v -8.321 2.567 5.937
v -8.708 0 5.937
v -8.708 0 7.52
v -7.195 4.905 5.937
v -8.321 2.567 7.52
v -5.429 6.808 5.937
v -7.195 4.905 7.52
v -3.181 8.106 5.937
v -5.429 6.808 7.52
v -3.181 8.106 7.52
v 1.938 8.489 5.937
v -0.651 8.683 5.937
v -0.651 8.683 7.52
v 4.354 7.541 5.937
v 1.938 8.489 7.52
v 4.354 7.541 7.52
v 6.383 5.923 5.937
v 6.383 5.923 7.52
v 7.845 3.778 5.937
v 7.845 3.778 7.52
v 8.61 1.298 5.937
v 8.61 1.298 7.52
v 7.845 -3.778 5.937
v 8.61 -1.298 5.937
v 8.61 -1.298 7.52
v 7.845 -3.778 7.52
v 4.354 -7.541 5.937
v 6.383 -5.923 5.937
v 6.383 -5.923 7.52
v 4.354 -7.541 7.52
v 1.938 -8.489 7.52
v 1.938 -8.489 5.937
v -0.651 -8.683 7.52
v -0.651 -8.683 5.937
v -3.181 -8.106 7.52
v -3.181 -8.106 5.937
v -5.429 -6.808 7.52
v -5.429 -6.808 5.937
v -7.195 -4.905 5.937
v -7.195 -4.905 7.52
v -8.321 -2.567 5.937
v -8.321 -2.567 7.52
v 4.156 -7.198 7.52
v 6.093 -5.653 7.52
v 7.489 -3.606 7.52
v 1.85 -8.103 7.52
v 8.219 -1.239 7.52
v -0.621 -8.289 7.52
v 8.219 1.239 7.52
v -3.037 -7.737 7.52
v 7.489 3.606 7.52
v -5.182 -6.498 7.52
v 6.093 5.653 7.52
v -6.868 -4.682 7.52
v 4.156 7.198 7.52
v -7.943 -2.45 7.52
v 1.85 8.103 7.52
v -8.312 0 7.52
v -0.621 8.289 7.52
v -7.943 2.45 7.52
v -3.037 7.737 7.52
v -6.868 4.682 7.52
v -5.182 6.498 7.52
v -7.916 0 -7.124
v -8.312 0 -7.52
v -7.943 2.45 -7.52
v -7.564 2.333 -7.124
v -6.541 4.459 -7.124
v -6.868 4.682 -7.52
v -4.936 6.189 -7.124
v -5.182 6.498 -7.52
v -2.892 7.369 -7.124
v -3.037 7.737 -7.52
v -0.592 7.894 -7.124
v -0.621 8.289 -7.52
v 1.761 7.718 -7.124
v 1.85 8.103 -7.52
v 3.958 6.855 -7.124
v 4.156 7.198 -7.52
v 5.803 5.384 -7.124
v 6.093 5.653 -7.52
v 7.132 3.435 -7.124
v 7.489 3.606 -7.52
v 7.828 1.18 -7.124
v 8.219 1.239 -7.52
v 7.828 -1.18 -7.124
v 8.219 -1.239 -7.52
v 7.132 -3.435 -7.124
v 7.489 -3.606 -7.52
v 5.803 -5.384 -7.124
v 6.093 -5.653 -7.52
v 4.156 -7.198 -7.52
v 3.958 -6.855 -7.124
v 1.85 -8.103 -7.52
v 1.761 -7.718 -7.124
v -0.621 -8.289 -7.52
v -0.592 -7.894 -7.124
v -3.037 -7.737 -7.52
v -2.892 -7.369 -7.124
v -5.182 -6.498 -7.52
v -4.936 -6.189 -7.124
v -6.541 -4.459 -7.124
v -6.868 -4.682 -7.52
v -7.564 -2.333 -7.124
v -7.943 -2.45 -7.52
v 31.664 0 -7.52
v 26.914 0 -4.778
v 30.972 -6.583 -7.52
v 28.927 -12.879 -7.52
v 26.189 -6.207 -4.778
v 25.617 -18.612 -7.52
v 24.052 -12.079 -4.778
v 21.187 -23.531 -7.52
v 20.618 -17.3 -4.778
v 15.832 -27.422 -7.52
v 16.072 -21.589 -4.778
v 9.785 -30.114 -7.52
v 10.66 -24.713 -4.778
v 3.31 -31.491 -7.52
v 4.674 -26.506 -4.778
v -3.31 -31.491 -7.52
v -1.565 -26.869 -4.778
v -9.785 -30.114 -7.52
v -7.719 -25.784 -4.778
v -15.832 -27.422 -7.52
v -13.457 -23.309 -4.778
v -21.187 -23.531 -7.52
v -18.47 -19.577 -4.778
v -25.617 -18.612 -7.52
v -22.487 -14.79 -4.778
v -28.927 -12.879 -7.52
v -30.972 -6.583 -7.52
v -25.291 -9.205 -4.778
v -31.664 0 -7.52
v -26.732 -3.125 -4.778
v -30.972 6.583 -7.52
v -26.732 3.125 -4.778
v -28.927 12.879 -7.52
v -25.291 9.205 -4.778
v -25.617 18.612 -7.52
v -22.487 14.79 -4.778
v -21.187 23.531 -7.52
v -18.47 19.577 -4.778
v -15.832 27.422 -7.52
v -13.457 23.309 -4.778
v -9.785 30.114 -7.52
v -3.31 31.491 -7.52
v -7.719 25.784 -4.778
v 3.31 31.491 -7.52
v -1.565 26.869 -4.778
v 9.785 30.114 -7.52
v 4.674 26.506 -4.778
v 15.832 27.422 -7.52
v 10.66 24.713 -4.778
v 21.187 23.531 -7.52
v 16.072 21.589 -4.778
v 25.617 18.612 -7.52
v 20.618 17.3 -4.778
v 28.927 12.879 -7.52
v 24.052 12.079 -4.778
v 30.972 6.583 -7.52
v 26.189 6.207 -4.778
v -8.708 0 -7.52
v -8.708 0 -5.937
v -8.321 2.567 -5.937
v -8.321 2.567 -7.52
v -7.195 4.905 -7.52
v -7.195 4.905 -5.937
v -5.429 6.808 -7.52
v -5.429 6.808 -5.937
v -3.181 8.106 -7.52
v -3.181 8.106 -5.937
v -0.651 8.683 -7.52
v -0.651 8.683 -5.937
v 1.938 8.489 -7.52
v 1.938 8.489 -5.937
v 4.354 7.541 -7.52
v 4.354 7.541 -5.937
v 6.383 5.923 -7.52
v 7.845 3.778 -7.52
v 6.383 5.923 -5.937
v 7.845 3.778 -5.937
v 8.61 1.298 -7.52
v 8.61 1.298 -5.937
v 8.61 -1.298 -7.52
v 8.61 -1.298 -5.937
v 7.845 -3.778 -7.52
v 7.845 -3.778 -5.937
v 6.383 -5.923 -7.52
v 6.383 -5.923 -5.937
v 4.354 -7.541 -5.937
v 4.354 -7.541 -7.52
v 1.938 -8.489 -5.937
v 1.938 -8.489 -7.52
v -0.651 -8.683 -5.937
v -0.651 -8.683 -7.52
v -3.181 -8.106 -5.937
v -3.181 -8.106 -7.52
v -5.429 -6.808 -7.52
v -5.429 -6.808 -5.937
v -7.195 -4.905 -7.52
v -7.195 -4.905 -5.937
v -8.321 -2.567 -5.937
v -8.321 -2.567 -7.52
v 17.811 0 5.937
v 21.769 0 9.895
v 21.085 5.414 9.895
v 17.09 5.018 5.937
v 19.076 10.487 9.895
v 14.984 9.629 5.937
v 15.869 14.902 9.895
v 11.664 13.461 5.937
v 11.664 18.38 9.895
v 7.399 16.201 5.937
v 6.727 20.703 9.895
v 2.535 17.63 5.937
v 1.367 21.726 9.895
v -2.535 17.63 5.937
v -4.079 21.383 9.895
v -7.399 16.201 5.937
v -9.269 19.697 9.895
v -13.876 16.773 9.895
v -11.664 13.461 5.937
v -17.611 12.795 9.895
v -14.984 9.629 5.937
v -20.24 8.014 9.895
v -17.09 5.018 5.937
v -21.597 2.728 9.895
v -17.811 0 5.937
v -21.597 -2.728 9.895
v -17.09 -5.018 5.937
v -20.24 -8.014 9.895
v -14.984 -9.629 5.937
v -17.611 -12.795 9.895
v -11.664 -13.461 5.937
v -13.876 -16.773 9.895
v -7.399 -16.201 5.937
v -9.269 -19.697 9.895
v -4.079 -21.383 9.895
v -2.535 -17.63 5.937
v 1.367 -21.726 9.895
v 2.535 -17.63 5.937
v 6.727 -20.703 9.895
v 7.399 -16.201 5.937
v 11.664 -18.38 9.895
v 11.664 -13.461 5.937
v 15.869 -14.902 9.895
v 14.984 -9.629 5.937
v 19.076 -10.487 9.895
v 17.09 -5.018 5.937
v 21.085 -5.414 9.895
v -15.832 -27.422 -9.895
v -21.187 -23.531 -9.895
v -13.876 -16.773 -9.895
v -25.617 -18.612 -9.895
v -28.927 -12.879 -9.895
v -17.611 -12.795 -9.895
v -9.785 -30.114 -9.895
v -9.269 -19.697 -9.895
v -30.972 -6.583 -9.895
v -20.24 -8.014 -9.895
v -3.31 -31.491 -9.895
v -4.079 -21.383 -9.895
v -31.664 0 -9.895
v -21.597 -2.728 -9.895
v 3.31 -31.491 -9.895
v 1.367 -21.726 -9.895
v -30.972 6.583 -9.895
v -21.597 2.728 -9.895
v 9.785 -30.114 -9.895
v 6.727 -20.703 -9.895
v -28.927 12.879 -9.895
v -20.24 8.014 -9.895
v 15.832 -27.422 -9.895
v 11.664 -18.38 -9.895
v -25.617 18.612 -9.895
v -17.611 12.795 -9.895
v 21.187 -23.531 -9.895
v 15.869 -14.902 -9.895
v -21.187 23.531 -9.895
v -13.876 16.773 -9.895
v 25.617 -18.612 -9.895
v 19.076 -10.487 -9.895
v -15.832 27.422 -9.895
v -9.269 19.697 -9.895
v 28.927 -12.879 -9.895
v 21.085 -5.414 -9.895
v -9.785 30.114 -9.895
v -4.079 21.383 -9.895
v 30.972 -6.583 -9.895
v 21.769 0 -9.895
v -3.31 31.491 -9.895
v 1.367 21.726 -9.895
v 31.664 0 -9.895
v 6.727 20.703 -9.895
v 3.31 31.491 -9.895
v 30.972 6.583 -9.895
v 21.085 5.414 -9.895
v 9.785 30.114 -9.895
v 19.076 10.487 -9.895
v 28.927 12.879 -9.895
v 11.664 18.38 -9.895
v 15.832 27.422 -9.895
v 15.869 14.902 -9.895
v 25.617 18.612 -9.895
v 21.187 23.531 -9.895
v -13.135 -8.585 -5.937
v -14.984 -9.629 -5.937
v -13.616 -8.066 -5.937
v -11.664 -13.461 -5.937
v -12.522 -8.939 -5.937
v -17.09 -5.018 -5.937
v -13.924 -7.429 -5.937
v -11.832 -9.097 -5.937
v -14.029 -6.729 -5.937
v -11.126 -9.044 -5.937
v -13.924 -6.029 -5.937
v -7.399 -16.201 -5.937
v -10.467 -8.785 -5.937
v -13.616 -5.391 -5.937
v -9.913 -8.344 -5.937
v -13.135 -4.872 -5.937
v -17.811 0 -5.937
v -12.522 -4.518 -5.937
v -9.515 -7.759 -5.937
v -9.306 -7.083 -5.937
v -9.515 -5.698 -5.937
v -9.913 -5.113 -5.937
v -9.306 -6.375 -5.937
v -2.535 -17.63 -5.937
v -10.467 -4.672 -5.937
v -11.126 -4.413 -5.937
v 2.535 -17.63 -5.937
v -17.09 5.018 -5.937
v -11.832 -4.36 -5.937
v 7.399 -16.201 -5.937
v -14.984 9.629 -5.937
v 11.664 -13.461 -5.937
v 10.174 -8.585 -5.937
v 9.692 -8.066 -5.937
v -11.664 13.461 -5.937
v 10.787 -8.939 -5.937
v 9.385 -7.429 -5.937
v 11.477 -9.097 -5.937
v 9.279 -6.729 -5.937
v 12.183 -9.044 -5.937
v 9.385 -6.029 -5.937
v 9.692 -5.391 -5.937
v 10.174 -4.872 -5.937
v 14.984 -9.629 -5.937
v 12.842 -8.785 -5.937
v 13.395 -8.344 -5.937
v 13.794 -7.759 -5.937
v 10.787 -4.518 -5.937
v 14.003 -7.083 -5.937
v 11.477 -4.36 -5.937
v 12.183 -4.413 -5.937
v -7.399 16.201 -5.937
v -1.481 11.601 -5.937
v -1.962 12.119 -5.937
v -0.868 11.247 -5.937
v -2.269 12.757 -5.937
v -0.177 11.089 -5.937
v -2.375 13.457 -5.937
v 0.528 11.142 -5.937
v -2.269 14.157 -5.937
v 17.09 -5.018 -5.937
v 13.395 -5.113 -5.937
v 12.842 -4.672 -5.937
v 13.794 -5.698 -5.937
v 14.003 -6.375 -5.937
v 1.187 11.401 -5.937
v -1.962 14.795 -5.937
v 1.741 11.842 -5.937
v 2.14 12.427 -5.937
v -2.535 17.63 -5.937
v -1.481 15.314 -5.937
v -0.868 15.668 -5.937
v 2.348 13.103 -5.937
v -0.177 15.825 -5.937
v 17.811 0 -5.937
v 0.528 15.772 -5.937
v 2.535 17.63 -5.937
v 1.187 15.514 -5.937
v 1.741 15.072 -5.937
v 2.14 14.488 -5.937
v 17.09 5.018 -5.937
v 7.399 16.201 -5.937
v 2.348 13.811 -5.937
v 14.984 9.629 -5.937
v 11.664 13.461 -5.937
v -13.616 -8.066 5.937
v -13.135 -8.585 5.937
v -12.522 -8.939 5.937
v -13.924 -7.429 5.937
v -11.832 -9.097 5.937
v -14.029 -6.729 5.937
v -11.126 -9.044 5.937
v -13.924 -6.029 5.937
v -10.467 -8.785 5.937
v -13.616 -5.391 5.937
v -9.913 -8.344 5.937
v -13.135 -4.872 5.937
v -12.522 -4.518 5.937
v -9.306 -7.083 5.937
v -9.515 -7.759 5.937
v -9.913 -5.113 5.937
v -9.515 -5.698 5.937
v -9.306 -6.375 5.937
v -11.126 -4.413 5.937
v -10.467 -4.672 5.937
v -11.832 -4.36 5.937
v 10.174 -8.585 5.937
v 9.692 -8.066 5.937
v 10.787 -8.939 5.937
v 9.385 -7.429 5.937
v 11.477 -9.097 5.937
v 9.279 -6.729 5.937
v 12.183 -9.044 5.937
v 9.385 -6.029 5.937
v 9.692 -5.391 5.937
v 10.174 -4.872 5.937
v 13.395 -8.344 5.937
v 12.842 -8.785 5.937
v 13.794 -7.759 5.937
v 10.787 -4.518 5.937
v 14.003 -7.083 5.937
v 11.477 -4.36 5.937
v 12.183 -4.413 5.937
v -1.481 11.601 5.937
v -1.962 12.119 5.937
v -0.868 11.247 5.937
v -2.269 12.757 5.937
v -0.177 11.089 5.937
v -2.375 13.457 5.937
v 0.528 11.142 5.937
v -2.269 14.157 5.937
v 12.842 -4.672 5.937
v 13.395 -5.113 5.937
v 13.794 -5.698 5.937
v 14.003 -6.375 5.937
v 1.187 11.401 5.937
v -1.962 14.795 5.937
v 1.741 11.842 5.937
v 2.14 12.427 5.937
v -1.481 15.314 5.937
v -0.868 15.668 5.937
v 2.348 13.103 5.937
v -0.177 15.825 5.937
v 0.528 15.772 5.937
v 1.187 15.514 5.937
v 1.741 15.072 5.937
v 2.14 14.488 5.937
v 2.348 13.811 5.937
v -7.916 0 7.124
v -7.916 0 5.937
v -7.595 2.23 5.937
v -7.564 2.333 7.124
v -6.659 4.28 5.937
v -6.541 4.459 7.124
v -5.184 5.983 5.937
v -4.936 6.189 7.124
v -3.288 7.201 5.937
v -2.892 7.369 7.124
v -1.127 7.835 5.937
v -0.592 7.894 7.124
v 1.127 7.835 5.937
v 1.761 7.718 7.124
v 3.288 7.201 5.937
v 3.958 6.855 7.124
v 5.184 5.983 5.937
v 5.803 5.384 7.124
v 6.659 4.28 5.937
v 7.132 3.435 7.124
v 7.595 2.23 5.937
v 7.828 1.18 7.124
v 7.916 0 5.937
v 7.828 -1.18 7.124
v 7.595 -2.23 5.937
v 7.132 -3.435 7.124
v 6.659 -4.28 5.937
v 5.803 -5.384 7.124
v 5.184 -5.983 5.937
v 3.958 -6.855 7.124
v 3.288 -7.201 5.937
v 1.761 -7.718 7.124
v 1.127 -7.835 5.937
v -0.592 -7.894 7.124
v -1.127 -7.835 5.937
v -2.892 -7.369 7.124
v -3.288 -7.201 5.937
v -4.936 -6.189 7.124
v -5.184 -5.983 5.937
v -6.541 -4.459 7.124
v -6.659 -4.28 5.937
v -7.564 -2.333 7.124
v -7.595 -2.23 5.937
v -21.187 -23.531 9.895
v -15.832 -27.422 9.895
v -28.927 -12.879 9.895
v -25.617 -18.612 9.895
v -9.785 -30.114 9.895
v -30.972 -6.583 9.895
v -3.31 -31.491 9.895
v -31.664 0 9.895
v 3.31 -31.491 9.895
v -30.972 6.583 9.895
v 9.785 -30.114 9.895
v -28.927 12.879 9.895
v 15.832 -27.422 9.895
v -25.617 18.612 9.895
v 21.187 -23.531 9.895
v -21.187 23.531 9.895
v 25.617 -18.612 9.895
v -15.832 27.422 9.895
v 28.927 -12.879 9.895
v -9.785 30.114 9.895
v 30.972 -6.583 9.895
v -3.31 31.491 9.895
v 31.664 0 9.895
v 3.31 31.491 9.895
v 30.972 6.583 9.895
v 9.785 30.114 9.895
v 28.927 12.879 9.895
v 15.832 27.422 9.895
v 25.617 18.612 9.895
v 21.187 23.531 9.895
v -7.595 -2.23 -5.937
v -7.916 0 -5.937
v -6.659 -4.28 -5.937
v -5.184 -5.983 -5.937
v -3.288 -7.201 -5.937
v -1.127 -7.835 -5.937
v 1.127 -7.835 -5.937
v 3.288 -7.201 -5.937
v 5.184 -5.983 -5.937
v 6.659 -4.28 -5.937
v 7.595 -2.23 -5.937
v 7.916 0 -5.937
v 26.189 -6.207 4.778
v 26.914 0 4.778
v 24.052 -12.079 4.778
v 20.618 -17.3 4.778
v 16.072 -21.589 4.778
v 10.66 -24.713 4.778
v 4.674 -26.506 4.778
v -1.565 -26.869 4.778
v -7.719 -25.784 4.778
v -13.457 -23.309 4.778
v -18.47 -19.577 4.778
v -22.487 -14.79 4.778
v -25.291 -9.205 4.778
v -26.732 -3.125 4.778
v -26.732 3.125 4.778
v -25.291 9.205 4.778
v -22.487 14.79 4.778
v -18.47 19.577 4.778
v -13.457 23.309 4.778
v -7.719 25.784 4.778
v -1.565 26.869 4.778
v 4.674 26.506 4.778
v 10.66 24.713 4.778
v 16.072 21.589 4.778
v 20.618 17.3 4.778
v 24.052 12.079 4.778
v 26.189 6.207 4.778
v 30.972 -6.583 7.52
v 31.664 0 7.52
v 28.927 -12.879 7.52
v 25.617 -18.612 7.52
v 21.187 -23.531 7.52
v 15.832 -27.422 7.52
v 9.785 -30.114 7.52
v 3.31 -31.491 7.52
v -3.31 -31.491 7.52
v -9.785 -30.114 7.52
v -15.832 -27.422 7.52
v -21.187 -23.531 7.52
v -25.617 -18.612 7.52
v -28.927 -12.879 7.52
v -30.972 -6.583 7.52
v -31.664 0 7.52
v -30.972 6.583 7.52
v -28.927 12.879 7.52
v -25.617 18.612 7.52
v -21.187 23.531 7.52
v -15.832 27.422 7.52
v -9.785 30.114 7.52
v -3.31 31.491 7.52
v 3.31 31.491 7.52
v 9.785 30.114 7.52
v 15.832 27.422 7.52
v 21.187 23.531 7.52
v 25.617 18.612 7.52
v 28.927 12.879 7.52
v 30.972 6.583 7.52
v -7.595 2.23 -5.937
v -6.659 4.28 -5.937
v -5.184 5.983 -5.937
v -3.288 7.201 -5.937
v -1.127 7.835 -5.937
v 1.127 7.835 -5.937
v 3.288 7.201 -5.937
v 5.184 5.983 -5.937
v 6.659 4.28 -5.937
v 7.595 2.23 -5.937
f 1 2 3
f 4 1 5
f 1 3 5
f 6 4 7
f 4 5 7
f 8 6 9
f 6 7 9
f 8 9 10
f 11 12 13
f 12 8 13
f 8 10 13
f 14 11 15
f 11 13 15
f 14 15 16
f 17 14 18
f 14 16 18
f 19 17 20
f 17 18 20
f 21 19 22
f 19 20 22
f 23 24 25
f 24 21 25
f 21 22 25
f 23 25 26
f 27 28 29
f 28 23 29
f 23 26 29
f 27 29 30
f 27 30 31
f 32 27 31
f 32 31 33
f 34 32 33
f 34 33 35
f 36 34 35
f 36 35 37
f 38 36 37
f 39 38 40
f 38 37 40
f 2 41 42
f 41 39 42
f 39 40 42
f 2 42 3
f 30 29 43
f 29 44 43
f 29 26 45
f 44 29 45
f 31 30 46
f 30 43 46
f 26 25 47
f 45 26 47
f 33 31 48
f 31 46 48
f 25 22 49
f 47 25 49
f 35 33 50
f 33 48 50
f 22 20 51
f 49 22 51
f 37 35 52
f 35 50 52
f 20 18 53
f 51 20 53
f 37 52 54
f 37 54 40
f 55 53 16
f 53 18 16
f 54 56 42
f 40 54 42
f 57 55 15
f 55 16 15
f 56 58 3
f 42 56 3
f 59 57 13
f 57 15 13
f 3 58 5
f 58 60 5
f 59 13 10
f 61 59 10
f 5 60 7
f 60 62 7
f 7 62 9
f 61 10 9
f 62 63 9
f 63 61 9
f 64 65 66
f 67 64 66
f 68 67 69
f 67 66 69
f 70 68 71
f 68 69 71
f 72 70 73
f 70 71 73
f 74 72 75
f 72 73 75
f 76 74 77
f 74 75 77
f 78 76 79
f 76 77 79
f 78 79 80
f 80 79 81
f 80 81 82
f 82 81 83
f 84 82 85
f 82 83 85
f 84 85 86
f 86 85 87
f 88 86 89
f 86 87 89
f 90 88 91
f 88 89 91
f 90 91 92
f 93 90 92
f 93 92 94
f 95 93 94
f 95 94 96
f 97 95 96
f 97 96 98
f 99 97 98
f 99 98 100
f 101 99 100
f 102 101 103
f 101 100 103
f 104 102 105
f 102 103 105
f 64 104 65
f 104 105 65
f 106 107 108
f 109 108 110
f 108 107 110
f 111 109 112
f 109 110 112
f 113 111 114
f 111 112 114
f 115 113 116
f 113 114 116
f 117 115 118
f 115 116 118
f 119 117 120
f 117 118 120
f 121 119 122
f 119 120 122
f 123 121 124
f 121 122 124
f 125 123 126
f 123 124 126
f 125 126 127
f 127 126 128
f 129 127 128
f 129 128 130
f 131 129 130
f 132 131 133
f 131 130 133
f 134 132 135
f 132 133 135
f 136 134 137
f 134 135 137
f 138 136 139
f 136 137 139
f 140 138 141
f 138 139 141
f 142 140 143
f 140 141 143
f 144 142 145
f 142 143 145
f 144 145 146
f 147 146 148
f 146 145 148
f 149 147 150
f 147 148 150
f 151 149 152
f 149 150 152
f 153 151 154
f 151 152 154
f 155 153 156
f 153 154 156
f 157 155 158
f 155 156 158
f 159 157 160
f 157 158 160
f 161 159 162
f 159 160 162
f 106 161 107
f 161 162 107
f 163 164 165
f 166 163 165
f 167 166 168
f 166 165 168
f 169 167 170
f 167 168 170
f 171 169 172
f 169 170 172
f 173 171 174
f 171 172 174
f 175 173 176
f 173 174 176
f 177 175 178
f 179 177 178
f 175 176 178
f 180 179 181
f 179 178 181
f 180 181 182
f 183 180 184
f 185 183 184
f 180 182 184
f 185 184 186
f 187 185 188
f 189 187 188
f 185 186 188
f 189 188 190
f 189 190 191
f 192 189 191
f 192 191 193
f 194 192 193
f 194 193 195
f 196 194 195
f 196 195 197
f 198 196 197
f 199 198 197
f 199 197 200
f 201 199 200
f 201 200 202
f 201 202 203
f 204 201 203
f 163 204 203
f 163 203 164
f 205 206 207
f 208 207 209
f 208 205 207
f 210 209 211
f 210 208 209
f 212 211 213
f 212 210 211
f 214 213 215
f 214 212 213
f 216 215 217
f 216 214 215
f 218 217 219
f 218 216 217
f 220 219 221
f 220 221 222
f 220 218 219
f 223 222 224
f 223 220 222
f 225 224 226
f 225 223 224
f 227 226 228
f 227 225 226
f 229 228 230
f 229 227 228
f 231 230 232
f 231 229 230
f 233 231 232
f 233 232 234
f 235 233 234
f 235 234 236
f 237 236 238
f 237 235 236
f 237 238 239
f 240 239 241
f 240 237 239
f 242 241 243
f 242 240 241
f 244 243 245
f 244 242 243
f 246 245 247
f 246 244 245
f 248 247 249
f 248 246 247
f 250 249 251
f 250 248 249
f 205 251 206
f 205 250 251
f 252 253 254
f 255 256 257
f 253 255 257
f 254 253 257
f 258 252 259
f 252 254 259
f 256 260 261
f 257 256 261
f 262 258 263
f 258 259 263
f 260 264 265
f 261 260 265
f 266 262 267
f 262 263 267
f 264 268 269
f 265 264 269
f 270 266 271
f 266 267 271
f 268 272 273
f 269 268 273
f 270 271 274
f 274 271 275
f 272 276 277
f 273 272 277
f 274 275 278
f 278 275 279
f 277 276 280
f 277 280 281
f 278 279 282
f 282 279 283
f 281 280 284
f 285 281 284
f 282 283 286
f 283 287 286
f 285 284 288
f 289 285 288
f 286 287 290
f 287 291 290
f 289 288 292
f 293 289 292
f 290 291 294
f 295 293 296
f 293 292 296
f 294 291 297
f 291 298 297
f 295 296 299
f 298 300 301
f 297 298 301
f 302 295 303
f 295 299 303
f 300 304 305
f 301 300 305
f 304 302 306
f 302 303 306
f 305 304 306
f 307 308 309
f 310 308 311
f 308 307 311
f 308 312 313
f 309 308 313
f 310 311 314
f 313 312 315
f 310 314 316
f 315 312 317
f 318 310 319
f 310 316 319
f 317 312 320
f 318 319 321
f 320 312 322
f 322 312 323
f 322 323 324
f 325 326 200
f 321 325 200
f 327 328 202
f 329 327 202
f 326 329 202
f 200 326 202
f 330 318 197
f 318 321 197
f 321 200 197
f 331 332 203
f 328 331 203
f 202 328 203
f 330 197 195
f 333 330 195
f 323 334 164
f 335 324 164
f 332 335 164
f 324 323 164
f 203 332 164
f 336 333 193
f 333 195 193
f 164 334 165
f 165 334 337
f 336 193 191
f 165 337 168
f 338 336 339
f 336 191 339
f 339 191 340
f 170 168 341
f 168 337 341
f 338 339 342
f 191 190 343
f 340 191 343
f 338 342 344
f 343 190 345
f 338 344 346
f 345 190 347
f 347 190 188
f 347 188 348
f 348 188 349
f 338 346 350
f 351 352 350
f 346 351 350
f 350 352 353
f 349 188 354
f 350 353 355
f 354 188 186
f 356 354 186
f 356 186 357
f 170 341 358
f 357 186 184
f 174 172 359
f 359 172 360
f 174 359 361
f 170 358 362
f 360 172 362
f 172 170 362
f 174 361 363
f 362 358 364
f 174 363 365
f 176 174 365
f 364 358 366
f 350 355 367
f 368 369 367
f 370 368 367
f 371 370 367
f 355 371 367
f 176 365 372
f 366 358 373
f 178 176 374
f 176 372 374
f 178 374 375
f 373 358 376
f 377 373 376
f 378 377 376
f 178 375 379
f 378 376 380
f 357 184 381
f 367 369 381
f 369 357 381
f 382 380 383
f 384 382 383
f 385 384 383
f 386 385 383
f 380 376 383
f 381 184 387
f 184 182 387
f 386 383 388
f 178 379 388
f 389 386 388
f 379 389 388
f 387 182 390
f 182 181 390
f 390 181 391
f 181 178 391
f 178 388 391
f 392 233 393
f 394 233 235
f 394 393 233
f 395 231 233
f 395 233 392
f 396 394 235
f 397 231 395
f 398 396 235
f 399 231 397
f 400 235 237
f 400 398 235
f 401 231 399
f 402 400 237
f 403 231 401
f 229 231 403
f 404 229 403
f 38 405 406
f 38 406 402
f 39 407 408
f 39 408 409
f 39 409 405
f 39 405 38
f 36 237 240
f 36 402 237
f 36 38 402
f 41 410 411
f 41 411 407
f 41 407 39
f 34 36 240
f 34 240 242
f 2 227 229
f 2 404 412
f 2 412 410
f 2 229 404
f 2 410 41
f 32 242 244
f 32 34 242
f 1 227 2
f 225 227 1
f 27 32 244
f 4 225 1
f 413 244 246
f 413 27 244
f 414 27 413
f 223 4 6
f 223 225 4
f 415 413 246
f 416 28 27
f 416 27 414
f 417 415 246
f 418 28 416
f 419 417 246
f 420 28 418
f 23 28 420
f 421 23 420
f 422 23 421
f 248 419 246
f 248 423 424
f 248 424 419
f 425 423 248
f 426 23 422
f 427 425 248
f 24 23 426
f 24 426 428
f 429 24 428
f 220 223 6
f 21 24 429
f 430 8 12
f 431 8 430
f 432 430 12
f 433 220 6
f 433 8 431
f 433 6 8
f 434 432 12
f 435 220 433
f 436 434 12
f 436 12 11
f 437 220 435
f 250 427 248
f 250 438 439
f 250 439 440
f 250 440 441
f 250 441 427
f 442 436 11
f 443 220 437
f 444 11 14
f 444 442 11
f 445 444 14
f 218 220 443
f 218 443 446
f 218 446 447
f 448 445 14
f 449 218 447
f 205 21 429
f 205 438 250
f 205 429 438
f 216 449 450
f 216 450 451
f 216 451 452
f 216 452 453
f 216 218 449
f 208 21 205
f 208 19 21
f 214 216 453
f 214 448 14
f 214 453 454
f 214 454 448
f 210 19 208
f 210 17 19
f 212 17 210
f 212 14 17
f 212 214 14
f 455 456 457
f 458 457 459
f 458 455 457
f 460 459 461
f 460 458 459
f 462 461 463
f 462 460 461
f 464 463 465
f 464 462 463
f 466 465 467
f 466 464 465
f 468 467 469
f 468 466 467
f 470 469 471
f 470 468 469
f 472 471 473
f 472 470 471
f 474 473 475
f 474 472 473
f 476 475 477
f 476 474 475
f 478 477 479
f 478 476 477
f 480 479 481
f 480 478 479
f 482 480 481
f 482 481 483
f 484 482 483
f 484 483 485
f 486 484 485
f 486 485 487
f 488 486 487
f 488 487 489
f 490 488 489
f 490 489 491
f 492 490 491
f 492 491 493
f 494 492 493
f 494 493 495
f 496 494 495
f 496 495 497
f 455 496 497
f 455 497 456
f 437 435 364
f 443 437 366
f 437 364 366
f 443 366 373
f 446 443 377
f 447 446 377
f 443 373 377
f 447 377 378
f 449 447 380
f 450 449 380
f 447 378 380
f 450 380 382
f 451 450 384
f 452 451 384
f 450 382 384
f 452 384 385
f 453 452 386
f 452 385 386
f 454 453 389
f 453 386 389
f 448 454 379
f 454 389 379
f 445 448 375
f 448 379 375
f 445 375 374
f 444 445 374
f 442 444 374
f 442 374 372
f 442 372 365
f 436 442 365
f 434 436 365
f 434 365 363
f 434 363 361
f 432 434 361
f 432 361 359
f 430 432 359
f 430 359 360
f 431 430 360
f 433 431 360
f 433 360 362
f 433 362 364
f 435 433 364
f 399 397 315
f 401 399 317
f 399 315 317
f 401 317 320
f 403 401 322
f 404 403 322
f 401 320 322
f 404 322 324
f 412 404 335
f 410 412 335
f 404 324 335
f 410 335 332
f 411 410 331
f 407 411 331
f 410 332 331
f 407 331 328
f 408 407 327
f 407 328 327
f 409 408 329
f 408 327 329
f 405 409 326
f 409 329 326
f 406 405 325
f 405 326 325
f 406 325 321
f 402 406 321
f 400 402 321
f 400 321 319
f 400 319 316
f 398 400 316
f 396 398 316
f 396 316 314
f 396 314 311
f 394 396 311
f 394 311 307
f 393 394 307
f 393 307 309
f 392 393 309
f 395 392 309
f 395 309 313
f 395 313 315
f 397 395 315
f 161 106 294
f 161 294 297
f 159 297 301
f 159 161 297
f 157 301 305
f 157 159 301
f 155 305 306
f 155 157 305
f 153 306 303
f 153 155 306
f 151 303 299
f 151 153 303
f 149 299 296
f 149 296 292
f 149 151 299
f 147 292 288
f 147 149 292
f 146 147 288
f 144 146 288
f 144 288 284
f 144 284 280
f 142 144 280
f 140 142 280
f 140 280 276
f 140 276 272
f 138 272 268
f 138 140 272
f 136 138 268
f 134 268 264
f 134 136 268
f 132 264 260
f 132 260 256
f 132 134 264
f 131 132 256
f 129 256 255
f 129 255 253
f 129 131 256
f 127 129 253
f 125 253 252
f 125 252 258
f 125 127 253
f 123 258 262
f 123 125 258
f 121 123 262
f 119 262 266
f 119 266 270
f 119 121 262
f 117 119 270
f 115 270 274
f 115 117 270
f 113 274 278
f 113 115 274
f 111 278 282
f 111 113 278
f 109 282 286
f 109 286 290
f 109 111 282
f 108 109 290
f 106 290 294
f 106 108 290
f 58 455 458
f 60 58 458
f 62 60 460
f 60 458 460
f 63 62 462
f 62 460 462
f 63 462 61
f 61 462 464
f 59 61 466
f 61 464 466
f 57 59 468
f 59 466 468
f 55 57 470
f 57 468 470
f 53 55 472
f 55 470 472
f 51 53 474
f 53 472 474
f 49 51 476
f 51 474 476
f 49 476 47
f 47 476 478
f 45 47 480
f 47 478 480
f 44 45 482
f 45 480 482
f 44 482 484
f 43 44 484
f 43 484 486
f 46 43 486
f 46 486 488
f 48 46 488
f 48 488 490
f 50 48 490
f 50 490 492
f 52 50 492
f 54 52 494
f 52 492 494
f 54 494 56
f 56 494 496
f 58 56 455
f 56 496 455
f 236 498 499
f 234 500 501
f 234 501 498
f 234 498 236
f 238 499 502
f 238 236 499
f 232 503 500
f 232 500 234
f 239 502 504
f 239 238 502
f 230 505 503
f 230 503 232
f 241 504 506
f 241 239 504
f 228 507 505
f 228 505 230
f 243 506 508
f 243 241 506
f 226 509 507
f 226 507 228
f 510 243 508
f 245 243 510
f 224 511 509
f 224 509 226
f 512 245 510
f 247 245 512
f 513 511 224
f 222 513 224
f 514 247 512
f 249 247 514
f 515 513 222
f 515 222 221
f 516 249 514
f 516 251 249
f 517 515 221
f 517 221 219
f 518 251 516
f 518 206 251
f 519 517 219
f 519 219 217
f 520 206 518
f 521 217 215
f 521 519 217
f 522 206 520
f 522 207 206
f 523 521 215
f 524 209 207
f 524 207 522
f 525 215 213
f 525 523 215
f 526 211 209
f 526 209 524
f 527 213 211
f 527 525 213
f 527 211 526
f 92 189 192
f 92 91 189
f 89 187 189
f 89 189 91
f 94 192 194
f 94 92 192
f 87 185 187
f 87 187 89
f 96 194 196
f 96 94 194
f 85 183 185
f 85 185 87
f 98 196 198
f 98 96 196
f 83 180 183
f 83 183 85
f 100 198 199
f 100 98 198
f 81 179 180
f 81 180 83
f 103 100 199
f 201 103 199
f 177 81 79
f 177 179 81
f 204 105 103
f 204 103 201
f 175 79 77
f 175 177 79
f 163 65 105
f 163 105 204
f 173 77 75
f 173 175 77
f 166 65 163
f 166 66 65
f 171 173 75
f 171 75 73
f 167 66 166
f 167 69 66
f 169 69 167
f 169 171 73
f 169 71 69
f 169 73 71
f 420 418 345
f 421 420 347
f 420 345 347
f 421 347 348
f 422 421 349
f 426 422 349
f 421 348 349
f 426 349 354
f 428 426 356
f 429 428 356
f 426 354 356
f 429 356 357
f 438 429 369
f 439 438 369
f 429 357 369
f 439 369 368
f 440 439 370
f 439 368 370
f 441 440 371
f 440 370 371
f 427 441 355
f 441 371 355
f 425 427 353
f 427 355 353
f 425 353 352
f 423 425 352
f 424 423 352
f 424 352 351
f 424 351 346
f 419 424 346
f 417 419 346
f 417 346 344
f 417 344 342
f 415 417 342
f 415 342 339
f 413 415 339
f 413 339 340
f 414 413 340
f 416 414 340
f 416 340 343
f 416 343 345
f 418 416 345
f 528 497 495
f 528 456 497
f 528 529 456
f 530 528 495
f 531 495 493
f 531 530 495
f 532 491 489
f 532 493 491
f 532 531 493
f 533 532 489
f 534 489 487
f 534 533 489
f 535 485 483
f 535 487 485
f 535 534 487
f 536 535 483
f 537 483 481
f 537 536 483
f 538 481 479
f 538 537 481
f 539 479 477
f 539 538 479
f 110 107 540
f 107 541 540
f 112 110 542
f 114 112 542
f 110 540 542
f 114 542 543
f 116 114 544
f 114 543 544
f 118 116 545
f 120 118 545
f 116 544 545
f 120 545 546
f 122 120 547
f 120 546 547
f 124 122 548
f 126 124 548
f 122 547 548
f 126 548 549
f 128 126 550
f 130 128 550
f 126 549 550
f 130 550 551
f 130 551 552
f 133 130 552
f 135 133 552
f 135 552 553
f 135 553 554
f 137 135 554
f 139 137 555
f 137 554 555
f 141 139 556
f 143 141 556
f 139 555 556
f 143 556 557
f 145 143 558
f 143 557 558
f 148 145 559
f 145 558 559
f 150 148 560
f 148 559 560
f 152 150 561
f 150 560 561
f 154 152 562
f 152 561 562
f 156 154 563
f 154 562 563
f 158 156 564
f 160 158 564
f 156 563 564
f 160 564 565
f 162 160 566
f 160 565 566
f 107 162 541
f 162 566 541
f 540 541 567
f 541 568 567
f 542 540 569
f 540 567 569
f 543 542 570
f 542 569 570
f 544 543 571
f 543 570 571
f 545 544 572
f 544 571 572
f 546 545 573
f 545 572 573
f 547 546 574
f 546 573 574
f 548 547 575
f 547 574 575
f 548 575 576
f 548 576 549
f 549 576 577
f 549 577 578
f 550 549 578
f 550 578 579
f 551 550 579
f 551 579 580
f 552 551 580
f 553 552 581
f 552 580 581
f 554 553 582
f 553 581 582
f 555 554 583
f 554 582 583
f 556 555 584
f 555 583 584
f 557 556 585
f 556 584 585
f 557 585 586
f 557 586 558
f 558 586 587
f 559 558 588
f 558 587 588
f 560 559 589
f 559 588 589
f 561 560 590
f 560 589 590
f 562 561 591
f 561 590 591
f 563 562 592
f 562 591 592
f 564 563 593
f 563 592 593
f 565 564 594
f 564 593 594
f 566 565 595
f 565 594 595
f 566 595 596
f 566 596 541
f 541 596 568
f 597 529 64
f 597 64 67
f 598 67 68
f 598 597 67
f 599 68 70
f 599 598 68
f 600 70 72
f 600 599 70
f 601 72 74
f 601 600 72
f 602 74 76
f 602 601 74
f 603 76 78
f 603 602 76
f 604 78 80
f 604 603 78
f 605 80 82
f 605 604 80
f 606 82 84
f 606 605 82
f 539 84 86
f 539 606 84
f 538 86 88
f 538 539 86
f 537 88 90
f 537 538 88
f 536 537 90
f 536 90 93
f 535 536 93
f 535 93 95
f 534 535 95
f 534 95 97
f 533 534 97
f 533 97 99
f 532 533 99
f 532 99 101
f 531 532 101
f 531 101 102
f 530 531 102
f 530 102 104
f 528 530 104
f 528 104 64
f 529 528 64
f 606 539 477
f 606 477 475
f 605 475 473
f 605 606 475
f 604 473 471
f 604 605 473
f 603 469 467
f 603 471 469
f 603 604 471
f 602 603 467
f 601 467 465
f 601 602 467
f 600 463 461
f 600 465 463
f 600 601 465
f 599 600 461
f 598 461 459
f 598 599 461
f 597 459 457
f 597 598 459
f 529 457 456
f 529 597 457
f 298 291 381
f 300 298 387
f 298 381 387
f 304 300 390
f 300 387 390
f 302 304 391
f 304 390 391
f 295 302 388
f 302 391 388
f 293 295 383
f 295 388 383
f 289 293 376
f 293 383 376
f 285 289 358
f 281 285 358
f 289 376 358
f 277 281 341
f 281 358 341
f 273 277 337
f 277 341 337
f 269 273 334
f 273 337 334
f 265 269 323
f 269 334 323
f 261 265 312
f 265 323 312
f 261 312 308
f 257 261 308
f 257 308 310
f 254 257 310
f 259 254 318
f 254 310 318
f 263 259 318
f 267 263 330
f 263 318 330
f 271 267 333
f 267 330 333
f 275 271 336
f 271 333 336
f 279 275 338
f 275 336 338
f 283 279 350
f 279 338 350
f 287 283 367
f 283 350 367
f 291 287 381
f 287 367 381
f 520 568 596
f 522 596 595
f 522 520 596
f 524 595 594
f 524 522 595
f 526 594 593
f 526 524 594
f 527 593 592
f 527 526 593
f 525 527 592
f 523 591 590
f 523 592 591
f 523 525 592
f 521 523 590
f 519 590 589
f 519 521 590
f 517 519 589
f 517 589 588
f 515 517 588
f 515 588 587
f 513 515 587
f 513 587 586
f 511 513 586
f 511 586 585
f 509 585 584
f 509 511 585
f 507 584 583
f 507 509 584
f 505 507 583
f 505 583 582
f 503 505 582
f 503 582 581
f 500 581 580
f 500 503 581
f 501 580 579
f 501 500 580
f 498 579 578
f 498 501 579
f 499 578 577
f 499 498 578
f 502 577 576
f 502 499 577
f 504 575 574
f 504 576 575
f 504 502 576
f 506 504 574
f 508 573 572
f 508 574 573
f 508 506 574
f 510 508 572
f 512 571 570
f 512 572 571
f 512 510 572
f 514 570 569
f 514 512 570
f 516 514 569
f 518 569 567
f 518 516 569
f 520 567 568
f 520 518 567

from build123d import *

# Parameters (mm, degrees)
ESQUISSE1_R             = 40
ESQUISSE1_R_2           = 10
BOSS_EXTRU_1_DEPTH      = 12.5
ESQUISSE2_R             = 22.5
ENL_V_MAT_EXTRU_1_DEPTH = 5
CHANFREIN1_SIZE         = 5
ESQUISSE4_R             = 3
ENL_V_MAT_EXTRU_2_DEPTH = 61
BOSS_EXTRU_2_DEPTH      = 2
BOSS_EXTRU_2_DEPTH_BACK = 17
ESQUISSE5_R             = 11
ESQUISSE5_R_2           = 10
CHANFREIN2_SIZE         = 0.5
ESCALA1_SCALE           = 0.7916


with BuildPart() as part:
    # Esquisse1 → Boss.-Extru.1 (new, symmetric)
    with BuildSketch(Plane.XY):
        Circle(ESQUISSE1_R)
        Circle(ESQUISSE1_R_2, mode=Mode.SUBTRACT)
    extrude(amount=BOSS_EXTRU_1_DEPTH, both=True)

    # Esquisse2 → Enlèv. mat.-Extru.1 (cut)
    with BuildSketch(Plane.XY.offset(12.5)):
        Circle(ESQUISSE2_R)
    enl_v_mat_extru_1 = extrude(amount=-ENL_V_MAT_EXTRU_1_DEPTH, mode=Mode.SUBTRACT)

    # Symétrie1: Enlèv. mat.-Extru.1 across plane
    add(enl_v_mat_extru_1.mirror(Plane.XY), mode=Mode.SUBTRACT)

    # Esquisse3 → Enlèvement de matière-Révolution1 (revolve, cut)
    with BuildSketch(Plane(origin=(0, 0, 0), x_dir=(1, 0, 0), z_dir=(0, 1, 0))):
        Polygon((40, 9.5), (34, 6.035898385), (34, -6.035898385), (40, -9.5), align=None)
    revolve(axis=Axis((0, 0, 0), (0, 0, -1)), mode=Mode.SUBTRACT)

    # Chanfrein1
    chanfrein1_edges = [part.edges().sort_by_distance(p)[0] for p in [
        (-22.5, 0, 12.5),
        (-22.5, 0, -12.5),
    ]]
    chamfer(chanfrein1_edges, length=CHANFREIN1_SIZE - 0.0001)  # a hair under: the kernel refuses the full size

    # Esquisse4 → Enlèv. mat.-Extru.2 (cut, through all)
    with BuildSketch(Plane(origin=(0, 0, -7.5), x_dir=(-1, 0, 0), z_dir=(0, 0, -1))):
        with Locations((0, 17)):
            Circle(ESQUISSE4_R)
        with Locations((14.722431864, -8.5)):
            Circle(ESQUISSE4_R)
        with Locations((-14.722431864, -8.5)):
            Circle(ESQUISSE4_R)
    extrude(amount=-ENL_V_MAT_EXTRU_2_DEPTH, mode=Mode.SUBTRACT)

    # Esquisse5 → Boss.-Extru.2 (add, two sides: drawn at the far end of the back side and taken through both)
    with BuildSketch(Plane(origin=(0, 0, -7.5), x_dir=(-1, 0, 0), z_dir=(0, 0, -1)).offset(-BOSS_EXTRU_2_DEPTH_BACK)):
        Circle(ESQUISSE5_R)
        Circle(ESQUISSE5_R_2, mode=Mode.SUBTRACT)
    extrude(amount=BOSS_EXTRU_2_DEPTH + BOSS_EXTRU_2_DEPTH_BACK)

    # Chanfrein2
    chanfrein2_edges = [part.edges().sort_by_distance(p)[0] for p in [
        (10, 0, 9.5),
        (10, 0, -9.5),
    ]]
    chamfer(chanfrein2_edges, length=CHANFREIN2_SIZE)


with BuildPart() as part_1:
    # Escala1: scaled about (0, 0, 0)
    add(part.part.scale(ESCALA1_SCALE))


solid = part_1.part
